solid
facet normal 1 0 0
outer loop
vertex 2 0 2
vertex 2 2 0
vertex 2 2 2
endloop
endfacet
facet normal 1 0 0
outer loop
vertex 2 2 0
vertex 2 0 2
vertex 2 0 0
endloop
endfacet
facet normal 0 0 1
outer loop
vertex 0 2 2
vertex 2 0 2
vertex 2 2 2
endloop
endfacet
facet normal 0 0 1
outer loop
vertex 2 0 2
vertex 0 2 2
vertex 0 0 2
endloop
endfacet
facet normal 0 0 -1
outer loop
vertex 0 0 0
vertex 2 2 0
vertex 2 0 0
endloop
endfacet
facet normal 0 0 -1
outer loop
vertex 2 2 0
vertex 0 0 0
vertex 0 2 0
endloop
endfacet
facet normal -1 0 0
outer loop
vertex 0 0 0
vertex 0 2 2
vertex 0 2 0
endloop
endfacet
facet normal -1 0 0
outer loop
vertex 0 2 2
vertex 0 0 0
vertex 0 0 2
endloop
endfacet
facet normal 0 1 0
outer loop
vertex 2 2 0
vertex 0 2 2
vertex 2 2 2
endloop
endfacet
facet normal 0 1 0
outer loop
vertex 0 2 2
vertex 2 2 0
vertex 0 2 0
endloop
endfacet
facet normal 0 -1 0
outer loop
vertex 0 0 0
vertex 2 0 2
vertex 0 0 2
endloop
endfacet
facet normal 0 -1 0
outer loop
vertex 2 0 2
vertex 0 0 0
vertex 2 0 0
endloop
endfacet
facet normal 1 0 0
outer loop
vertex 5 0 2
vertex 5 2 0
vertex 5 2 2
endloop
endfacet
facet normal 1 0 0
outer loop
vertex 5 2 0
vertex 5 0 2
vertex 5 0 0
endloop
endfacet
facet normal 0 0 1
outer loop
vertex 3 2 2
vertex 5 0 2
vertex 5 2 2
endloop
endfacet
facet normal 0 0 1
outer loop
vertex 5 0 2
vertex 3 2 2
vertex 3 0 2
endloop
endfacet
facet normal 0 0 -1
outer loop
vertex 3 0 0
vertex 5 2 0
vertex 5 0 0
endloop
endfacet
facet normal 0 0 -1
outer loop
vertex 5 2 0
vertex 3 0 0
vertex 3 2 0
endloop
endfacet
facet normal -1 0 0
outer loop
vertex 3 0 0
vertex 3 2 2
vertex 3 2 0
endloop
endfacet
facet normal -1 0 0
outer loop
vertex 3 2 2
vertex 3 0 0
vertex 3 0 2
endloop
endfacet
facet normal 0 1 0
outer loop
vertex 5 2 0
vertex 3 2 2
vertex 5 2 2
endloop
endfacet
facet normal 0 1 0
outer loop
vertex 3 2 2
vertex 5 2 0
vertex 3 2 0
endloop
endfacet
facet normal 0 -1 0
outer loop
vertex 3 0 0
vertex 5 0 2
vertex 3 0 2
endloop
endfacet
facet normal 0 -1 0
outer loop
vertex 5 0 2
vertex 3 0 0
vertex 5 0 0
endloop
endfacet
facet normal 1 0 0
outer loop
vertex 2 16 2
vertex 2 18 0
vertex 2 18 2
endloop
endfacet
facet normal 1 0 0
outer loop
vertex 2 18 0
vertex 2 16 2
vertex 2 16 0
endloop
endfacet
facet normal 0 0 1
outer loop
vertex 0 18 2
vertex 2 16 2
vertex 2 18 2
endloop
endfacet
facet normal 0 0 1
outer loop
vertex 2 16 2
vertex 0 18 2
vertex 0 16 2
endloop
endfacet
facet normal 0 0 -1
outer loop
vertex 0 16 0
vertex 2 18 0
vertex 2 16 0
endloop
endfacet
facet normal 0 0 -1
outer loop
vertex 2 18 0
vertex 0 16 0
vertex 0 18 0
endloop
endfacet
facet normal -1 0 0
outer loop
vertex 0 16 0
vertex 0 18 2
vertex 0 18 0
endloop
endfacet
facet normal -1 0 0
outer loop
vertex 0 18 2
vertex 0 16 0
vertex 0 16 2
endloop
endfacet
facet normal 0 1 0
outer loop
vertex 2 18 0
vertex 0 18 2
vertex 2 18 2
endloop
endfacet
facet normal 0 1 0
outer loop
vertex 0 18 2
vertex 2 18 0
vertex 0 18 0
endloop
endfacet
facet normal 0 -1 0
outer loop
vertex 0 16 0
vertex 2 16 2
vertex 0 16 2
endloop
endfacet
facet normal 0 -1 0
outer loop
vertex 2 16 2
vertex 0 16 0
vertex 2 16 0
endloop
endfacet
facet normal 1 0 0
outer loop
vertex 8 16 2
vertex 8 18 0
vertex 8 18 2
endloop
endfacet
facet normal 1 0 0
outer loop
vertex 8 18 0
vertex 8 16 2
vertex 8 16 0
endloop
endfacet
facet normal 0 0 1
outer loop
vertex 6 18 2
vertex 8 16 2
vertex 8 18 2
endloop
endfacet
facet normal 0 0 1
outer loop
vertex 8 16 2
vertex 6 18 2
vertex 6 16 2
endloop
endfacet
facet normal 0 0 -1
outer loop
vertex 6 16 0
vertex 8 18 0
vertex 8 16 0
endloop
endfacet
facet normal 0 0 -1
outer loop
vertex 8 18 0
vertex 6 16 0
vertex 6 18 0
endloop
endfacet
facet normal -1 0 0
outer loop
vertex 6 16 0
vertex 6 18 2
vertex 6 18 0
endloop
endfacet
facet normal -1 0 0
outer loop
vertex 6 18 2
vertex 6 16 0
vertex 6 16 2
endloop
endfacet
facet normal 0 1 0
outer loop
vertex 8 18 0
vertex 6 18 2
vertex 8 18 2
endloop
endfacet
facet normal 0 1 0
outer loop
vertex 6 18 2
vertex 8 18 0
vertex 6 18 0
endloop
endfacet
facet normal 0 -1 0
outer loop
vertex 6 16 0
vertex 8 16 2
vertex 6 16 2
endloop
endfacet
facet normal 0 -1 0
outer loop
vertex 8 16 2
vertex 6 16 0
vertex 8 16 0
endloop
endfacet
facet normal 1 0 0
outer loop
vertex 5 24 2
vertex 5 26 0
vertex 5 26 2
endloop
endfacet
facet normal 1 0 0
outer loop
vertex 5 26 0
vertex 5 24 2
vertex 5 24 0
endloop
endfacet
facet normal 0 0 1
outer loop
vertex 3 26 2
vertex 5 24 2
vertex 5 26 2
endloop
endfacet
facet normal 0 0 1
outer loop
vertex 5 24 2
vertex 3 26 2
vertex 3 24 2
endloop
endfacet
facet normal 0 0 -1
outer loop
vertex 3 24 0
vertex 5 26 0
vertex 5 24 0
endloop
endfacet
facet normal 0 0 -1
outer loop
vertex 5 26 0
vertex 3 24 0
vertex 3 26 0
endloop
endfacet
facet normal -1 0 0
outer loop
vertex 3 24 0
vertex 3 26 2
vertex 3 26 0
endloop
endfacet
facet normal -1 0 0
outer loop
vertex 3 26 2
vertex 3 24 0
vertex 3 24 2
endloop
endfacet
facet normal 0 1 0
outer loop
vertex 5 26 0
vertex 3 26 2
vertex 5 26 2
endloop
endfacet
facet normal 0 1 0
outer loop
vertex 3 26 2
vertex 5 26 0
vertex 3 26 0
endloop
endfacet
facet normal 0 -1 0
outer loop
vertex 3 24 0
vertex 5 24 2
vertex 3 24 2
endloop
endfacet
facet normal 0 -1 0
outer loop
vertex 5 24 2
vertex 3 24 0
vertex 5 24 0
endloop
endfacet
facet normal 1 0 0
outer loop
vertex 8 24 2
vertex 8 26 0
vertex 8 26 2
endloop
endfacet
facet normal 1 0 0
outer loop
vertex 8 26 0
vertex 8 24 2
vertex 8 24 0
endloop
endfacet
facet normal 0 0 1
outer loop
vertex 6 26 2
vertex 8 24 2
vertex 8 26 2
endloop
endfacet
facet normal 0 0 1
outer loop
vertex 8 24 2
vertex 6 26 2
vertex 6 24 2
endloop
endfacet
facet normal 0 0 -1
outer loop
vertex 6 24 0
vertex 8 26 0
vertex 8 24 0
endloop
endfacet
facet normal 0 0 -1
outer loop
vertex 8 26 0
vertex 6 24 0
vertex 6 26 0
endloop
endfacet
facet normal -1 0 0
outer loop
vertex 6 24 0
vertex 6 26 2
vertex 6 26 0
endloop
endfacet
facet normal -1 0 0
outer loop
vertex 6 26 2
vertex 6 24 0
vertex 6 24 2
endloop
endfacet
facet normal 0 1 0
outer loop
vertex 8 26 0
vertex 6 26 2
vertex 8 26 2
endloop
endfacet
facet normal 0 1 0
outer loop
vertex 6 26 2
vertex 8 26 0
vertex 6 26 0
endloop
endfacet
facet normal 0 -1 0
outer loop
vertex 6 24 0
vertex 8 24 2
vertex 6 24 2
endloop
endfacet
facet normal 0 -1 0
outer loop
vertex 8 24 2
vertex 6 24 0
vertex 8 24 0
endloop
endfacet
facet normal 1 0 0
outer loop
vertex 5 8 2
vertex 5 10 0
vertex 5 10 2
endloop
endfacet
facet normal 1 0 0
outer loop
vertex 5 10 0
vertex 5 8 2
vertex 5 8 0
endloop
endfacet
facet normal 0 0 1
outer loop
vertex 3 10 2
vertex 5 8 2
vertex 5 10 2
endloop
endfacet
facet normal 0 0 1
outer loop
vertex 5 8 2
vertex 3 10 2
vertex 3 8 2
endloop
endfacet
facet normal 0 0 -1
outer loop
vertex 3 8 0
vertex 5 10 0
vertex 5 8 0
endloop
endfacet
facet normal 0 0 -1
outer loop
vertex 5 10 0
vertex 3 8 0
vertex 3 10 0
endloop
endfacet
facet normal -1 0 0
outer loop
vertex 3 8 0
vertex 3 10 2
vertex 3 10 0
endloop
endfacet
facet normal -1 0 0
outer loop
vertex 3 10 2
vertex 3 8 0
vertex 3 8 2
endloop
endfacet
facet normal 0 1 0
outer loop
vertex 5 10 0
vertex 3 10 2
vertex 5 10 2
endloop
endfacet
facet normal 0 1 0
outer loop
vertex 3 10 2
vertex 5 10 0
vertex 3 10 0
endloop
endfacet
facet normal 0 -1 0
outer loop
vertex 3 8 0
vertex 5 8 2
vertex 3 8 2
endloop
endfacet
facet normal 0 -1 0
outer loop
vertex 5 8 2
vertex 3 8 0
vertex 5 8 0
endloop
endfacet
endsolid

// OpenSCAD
// `children()` with no argument, an index, a list of indices, and a range.
module all()    { children(); }
module one()    { children(1); }
module some()   { children([0, 2]); }
module ranged() { children([1:2]); }
all()    { cube(2); translate([3,0,0]) cube(2); }
translate([0,8,0])  one()    { cube(9); translate([3,0,0]) cube(2); }
translate([0,16,0]) some()   { cube(2); translate([3,0,0]) cube(9); translate([6,0,0]) cube(2); }
translate([0,24,0]) ranged() { cube(9); translate([3,0,0]) cube(2); translate([6,0,0]) cube(2); }
